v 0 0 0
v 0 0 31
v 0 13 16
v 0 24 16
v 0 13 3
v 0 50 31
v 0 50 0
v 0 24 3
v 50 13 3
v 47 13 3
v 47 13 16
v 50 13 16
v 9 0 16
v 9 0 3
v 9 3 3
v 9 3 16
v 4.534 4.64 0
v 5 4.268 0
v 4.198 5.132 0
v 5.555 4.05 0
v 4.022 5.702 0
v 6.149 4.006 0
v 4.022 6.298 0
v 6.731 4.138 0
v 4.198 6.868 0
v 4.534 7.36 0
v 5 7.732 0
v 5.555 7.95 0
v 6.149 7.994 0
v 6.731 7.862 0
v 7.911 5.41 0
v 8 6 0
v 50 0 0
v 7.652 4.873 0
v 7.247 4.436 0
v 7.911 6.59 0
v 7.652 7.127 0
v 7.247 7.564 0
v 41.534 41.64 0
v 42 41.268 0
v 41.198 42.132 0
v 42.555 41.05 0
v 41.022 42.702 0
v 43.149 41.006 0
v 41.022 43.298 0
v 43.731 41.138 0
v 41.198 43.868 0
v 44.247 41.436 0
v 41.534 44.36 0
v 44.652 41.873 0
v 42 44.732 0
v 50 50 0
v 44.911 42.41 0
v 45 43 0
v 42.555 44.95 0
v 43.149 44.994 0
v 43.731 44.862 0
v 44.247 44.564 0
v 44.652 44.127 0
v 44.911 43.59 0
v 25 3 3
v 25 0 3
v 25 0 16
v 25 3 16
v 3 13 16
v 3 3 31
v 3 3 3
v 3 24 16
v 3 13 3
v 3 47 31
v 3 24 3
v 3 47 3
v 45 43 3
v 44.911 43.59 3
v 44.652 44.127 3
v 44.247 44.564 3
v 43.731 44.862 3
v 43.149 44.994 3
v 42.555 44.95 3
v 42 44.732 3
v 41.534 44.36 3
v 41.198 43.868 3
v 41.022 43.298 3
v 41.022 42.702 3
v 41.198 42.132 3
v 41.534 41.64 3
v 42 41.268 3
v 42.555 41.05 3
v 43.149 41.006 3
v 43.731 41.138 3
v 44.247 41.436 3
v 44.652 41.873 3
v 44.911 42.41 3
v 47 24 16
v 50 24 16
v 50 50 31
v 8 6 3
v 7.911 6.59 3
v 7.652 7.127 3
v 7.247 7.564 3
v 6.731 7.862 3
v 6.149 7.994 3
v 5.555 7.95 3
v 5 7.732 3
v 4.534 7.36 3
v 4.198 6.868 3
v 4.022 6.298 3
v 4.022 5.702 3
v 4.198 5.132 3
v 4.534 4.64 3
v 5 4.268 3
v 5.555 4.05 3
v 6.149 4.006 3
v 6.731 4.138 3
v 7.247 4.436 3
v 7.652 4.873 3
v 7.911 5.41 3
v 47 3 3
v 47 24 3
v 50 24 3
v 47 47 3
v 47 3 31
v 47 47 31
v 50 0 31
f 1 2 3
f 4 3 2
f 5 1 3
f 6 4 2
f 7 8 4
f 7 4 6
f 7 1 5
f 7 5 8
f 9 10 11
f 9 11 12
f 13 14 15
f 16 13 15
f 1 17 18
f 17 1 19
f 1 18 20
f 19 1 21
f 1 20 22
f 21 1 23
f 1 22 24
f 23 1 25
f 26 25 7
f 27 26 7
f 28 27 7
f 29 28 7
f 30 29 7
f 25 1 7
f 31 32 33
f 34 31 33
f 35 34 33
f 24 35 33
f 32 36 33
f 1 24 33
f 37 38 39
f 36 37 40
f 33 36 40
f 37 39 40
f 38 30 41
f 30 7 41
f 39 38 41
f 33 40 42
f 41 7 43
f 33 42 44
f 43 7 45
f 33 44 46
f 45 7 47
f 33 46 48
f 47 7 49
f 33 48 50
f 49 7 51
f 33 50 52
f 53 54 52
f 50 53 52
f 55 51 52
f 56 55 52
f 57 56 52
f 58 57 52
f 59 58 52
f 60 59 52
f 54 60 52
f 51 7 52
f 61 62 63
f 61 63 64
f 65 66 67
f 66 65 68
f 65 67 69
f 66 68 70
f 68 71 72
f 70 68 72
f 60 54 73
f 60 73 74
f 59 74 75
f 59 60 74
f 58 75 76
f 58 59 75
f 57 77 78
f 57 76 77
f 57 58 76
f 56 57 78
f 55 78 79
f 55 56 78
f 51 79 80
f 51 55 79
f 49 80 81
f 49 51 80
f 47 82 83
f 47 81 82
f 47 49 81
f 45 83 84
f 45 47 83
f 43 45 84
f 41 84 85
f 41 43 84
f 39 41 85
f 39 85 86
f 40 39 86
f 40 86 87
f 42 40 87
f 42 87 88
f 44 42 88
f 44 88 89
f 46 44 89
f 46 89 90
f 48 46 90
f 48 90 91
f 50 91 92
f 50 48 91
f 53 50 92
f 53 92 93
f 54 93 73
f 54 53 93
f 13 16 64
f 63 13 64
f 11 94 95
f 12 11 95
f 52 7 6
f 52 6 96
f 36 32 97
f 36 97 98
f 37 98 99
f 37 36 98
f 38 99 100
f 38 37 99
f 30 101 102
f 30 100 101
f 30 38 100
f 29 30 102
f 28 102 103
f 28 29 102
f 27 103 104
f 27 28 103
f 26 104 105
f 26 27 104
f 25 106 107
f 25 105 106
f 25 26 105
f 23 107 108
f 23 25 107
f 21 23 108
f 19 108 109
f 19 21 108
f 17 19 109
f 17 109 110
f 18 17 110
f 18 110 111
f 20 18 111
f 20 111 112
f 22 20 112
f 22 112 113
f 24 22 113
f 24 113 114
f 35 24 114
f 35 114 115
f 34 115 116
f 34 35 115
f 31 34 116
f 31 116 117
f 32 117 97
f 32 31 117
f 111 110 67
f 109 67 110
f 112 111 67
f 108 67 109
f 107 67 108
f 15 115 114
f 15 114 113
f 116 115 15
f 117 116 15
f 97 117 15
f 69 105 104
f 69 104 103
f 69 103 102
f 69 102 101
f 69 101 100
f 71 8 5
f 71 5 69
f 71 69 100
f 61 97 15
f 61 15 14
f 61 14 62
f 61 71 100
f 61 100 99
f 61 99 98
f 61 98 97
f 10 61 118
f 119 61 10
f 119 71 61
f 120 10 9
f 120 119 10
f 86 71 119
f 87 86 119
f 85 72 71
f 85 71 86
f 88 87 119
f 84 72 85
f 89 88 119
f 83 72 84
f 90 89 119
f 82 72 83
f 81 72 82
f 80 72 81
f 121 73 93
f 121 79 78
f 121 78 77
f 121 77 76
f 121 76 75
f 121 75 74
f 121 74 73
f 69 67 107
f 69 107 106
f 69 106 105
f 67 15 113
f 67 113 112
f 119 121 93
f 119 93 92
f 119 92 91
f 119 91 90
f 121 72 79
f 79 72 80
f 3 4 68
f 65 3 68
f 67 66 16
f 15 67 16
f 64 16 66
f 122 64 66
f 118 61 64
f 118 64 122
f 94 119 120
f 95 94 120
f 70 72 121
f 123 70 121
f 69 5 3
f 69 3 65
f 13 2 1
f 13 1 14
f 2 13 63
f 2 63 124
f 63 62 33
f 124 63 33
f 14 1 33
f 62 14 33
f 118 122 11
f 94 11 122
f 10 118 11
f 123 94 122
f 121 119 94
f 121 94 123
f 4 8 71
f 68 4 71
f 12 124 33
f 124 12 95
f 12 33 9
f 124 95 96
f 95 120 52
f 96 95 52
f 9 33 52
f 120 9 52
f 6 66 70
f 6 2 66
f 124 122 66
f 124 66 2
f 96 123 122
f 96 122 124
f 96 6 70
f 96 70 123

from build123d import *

# Parameters (mm, degrees)
CYLINDER_R     = 2
CYLINDER_DEPTH = 10
BOX003_W       = 10
BOX003_H       = 11
BOX003_DEPTH   = 13
BOX002_W       = 16
BOX002_H       = 10
BOX002_DEPTH   = 13
BOX001_W       = 44
BOX001_H       = 44
BOX001_DEPTH   = 29
BOX_W          = 50
BOX_H          = 50
BOX_DEPTH      = 31


with BuildPart() as cylinder:
    # Cylinder → Cylinder (new body)
    with BuildSketch(Plane(origin=(6, 6, -1), x_dir=(1, 0, 0), z_dir=(0, 0, 1))):
        Circle(CYLINDER_R)
    extrude(amount=CYLINDER_DEPTH)


with BuildPart() as cylinder001:
    # Link001 base: copy of Cylinder
    add(cylinder.part)


with BuildPart() as cylinder001_1:
    # Link001 placement: moved
    add(cylinder001.part.moved(Location((37, 37, 0))))


with BuildPart() as cube003:
    # Box003 → Box003 (new body)
    with BuildSketch(Plane(origin=(-3, 13, 3), x_dir=(1, 0, 0), z_dir=(0, 0, 1))):
        with Locations((5, 5.5)):
            Rectangle(BOX003_W, BOX003_H)
    extrude(amount=BOX003_DEPTH)


with BuildPart() as cube004:
    # Link base: copy of Cube003
    add(cube003.part)


with BuildPart() as cube004_1:
    # Link placement: moved
    add(cube004.part.moved(Location((47, 0, 0))))


with BuildPart() as cube002:
    # Box002 → Box002 (new body)
    with BuildSketch(Plane(origin=(9, -7, 3), x_dir=(1, 0, 0), z_dir=(0, 0, 1))):
        with Locations((8, 5)):
            Rectangle(BOX002_W, BOX002_H)
    extrude(amount=BOX002_DEPTH)


with BuildPart() as cube001:
    # Box001 → Box001 (new body)
    with BuildSketch(Plane(origin=(3, 3, 3), x_dir=(1, 0, 0), z_dir=(0, 0, 1))):
        with Locations((22, 22)):
            Rectangle(BOX001_W, BOX001_H)
    extrude(amount=BOX001_DEPTH)


with BuildPart() as cut005:
    # Box → Box (new body)
    with BuildSketch(Plane.XY):
        with Locations((25, 25)):
            Rectangle(BOX_W, BOX_H)
    extrude(amount=BOX_DEPTH)

    # Cut: cut Cube001
    add(cube001.part, mode=Mode.SUBTRACT)

    # Cut001: cut Cube002
    add(cube002.part, mode=Mode.SUBTRACT)

    # Cut002: cut Cube003
    add(cube003.part, mode=Mode.SUBTRACT)

    # Cut003: cut Cube004
    add(cube004_1.part, mode=Mode.SUBTRACT)

    # Cut004: cut Cylinder
    add(cylinder.part, mode=Mode.SUBTRACT)

    # Cut005: cut Cylinder001
    add(cylinder001_1.part, mode=Mode.SUBTRACT)


solid = cut005.part
